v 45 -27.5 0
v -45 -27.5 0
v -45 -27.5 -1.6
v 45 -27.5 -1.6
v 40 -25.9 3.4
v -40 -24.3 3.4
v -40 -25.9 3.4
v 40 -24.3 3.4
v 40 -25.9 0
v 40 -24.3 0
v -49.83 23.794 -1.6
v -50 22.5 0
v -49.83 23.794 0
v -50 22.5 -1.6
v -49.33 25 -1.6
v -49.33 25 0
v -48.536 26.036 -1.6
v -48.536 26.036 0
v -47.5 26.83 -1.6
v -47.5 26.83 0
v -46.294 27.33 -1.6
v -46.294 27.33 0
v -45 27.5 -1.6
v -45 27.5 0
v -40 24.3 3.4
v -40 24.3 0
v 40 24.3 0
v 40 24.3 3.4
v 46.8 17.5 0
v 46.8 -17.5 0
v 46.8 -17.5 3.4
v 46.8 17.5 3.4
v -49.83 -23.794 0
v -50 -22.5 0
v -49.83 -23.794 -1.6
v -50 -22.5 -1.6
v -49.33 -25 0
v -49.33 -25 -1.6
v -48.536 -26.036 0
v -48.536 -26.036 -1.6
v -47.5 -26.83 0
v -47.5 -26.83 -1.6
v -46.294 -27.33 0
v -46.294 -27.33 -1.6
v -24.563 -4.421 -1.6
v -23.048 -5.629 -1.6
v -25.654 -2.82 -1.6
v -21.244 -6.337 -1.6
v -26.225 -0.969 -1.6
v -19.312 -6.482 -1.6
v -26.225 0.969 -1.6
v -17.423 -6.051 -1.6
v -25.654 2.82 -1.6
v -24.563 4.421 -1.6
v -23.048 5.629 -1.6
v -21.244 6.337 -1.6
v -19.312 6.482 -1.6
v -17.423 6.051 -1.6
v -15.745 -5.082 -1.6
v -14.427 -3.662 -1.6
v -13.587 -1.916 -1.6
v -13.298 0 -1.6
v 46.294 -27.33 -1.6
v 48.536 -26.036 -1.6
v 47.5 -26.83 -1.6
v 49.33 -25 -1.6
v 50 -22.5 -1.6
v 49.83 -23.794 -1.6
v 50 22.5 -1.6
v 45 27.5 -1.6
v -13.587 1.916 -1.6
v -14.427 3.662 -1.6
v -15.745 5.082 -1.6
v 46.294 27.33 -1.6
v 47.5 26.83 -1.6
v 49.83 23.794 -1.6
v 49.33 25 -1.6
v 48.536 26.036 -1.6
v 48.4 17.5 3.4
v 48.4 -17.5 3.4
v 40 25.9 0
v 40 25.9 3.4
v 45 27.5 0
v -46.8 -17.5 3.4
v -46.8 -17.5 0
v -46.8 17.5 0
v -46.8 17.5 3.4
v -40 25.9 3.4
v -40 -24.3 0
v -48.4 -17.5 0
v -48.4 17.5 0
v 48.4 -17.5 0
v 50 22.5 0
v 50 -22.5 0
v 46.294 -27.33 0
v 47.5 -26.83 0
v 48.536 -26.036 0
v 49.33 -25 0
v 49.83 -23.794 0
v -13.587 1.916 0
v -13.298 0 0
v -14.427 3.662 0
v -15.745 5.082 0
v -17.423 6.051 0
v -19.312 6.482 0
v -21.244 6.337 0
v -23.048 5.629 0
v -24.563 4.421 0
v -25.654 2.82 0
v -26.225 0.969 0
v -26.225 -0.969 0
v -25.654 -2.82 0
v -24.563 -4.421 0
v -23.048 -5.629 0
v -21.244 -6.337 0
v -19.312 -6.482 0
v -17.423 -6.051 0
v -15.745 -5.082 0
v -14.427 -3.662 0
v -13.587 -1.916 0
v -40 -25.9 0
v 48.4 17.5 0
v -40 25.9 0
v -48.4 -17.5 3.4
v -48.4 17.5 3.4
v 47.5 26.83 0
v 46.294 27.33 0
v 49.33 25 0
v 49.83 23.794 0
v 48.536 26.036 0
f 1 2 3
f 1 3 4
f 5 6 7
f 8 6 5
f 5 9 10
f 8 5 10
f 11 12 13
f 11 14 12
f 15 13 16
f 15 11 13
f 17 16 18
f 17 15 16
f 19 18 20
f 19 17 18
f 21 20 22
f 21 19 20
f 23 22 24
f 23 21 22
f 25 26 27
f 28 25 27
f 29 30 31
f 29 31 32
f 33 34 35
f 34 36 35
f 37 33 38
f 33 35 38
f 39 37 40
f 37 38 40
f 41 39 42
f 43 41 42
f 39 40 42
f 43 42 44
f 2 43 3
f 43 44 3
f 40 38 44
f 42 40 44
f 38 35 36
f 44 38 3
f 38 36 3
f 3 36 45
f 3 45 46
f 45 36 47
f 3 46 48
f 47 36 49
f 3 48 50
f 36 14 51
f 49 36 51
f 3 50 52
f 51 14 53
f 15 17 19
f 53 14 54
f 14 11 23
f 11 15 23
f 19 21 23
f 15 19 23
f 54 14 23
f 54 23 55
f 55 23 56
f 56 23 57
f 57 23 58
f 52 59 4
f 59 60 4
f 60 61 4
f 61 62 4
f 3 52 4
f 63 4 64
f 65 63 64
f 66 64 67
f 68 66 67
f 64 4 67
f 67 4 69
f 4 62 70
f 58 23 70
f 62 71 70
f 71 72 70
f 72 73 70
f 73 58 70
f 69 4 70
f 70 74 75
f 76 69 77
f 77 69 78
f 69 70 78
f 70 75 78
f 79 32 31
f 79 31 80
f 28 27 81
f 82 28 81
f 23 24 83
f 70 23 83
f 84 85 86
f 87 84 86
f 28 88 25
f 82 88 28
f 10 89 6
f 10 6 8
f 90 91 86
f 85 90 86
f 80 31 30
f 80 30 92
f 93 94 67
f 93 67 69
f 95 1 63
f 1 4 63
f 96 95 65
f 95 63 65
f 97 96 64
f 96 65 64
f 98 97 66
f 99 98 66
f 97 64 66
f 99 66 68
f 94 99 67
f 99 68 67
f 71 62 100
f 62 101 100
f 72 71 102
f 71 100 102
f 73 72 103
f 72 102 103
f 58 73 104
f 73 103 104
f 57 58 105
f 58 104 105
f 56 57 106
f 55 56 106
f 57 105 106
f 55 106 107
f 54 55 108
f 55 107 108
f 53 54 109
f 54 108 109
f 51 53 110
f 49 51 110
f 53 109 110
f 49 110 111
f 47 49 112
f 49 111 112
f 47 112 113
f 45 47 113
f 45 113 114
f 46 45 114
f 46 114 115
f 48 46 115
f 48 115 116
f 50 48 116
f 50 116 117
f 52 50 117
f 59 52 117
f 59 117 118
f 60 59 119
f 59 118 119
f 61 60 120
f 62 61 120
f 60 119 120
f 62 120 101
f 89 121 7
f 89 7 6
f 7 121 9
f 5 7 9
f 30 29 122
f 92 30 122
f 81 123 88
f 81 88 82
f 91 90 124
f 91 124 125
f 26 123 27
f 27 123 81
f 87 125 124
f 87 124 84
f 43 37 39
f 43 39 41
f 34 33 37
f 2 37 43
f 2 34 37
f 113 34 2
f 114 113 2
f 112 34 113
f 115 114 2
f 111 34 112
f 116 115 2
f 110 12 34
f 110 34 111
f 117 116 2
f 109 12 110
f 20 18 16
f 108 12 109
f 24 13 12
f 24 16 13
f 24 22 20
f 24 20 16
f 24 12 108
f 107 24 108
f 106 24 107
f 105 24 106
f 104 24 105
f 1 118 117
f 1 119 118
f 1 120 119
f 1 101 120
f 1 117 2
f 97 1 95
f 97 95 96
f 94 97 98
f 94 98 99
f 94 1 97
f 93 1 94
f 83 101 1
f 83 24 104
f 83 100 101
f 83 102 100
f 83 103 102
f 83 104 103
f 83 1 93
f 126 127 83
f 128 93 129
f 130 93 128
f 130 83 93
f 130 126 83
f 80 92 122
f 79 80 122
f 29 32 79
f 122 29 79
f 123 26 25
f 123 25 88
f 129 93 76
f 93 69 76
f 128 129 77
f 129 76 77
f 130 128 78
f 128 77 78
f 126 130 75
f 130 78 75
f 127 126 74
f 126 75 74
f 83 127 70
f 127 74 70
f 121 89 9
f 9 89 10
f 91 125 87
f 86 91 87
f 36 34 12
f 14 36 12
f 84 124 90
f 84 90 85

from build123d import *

# Parameters (mm, degrees)
F0_W     = 1.6
F0_H     = 35
F0_W_2   = 80
F0_H_2   = 1.6
F1_DEPTH = 3.4
F2_W     = 100
F2_H     = 55
F3_DEPTH = 1.6
F4_R     = 5
F5_R     = 6.5
F6_DEPTH = 2.5


with BuildPart() as f1:
    # F0 (on Top) → F1 (new body)
    with BuildSketch(Plane.XY):
        with Locations((47.6, 0)):
            Rectangle(F0_W, F0_H)
        with Locations((0, -25.1)):
            Rectangle(F0_W_2, F0_H_2)
        with Locations((0, 25.1)):
            Rectangle(F0_W_2, F0_H_2)
        with Locations((-47.6, 0)):
            Rectangle(F0_W, F0_H)
    extrude(amount=F1_DEPTH)


with BuildPart() as f3:
    # F2 (on Top) → F3 (new body)
    with BuildSketch(Plane.XY):
        Rectangle(F2_W, F2_H)
    extrude(amount=-F3_DEPTH)

    # F4
    f4_edges = [f3.edges().sort_by_distance(p)[0] for p in [
        (-50, -27.5, -0.8),
        (50, -27.5, -0.8),
        (50, 27.5, -0.8),
        (-50, 27.5, -0.8),
    ]]
    fillet(f4_edges, radius=F4_R)

    # F5 (on face) → F6 (cut, symmetric)
    with BuildSketch(Plane.XY):
        with Locations((-19.798, 0)):
            Circle(F5_R)
    extrude(amount=F6_DEPTH, both=True, mode=Mode.SUBTRACT)


solid = Compound([f1.part, f3.part])
